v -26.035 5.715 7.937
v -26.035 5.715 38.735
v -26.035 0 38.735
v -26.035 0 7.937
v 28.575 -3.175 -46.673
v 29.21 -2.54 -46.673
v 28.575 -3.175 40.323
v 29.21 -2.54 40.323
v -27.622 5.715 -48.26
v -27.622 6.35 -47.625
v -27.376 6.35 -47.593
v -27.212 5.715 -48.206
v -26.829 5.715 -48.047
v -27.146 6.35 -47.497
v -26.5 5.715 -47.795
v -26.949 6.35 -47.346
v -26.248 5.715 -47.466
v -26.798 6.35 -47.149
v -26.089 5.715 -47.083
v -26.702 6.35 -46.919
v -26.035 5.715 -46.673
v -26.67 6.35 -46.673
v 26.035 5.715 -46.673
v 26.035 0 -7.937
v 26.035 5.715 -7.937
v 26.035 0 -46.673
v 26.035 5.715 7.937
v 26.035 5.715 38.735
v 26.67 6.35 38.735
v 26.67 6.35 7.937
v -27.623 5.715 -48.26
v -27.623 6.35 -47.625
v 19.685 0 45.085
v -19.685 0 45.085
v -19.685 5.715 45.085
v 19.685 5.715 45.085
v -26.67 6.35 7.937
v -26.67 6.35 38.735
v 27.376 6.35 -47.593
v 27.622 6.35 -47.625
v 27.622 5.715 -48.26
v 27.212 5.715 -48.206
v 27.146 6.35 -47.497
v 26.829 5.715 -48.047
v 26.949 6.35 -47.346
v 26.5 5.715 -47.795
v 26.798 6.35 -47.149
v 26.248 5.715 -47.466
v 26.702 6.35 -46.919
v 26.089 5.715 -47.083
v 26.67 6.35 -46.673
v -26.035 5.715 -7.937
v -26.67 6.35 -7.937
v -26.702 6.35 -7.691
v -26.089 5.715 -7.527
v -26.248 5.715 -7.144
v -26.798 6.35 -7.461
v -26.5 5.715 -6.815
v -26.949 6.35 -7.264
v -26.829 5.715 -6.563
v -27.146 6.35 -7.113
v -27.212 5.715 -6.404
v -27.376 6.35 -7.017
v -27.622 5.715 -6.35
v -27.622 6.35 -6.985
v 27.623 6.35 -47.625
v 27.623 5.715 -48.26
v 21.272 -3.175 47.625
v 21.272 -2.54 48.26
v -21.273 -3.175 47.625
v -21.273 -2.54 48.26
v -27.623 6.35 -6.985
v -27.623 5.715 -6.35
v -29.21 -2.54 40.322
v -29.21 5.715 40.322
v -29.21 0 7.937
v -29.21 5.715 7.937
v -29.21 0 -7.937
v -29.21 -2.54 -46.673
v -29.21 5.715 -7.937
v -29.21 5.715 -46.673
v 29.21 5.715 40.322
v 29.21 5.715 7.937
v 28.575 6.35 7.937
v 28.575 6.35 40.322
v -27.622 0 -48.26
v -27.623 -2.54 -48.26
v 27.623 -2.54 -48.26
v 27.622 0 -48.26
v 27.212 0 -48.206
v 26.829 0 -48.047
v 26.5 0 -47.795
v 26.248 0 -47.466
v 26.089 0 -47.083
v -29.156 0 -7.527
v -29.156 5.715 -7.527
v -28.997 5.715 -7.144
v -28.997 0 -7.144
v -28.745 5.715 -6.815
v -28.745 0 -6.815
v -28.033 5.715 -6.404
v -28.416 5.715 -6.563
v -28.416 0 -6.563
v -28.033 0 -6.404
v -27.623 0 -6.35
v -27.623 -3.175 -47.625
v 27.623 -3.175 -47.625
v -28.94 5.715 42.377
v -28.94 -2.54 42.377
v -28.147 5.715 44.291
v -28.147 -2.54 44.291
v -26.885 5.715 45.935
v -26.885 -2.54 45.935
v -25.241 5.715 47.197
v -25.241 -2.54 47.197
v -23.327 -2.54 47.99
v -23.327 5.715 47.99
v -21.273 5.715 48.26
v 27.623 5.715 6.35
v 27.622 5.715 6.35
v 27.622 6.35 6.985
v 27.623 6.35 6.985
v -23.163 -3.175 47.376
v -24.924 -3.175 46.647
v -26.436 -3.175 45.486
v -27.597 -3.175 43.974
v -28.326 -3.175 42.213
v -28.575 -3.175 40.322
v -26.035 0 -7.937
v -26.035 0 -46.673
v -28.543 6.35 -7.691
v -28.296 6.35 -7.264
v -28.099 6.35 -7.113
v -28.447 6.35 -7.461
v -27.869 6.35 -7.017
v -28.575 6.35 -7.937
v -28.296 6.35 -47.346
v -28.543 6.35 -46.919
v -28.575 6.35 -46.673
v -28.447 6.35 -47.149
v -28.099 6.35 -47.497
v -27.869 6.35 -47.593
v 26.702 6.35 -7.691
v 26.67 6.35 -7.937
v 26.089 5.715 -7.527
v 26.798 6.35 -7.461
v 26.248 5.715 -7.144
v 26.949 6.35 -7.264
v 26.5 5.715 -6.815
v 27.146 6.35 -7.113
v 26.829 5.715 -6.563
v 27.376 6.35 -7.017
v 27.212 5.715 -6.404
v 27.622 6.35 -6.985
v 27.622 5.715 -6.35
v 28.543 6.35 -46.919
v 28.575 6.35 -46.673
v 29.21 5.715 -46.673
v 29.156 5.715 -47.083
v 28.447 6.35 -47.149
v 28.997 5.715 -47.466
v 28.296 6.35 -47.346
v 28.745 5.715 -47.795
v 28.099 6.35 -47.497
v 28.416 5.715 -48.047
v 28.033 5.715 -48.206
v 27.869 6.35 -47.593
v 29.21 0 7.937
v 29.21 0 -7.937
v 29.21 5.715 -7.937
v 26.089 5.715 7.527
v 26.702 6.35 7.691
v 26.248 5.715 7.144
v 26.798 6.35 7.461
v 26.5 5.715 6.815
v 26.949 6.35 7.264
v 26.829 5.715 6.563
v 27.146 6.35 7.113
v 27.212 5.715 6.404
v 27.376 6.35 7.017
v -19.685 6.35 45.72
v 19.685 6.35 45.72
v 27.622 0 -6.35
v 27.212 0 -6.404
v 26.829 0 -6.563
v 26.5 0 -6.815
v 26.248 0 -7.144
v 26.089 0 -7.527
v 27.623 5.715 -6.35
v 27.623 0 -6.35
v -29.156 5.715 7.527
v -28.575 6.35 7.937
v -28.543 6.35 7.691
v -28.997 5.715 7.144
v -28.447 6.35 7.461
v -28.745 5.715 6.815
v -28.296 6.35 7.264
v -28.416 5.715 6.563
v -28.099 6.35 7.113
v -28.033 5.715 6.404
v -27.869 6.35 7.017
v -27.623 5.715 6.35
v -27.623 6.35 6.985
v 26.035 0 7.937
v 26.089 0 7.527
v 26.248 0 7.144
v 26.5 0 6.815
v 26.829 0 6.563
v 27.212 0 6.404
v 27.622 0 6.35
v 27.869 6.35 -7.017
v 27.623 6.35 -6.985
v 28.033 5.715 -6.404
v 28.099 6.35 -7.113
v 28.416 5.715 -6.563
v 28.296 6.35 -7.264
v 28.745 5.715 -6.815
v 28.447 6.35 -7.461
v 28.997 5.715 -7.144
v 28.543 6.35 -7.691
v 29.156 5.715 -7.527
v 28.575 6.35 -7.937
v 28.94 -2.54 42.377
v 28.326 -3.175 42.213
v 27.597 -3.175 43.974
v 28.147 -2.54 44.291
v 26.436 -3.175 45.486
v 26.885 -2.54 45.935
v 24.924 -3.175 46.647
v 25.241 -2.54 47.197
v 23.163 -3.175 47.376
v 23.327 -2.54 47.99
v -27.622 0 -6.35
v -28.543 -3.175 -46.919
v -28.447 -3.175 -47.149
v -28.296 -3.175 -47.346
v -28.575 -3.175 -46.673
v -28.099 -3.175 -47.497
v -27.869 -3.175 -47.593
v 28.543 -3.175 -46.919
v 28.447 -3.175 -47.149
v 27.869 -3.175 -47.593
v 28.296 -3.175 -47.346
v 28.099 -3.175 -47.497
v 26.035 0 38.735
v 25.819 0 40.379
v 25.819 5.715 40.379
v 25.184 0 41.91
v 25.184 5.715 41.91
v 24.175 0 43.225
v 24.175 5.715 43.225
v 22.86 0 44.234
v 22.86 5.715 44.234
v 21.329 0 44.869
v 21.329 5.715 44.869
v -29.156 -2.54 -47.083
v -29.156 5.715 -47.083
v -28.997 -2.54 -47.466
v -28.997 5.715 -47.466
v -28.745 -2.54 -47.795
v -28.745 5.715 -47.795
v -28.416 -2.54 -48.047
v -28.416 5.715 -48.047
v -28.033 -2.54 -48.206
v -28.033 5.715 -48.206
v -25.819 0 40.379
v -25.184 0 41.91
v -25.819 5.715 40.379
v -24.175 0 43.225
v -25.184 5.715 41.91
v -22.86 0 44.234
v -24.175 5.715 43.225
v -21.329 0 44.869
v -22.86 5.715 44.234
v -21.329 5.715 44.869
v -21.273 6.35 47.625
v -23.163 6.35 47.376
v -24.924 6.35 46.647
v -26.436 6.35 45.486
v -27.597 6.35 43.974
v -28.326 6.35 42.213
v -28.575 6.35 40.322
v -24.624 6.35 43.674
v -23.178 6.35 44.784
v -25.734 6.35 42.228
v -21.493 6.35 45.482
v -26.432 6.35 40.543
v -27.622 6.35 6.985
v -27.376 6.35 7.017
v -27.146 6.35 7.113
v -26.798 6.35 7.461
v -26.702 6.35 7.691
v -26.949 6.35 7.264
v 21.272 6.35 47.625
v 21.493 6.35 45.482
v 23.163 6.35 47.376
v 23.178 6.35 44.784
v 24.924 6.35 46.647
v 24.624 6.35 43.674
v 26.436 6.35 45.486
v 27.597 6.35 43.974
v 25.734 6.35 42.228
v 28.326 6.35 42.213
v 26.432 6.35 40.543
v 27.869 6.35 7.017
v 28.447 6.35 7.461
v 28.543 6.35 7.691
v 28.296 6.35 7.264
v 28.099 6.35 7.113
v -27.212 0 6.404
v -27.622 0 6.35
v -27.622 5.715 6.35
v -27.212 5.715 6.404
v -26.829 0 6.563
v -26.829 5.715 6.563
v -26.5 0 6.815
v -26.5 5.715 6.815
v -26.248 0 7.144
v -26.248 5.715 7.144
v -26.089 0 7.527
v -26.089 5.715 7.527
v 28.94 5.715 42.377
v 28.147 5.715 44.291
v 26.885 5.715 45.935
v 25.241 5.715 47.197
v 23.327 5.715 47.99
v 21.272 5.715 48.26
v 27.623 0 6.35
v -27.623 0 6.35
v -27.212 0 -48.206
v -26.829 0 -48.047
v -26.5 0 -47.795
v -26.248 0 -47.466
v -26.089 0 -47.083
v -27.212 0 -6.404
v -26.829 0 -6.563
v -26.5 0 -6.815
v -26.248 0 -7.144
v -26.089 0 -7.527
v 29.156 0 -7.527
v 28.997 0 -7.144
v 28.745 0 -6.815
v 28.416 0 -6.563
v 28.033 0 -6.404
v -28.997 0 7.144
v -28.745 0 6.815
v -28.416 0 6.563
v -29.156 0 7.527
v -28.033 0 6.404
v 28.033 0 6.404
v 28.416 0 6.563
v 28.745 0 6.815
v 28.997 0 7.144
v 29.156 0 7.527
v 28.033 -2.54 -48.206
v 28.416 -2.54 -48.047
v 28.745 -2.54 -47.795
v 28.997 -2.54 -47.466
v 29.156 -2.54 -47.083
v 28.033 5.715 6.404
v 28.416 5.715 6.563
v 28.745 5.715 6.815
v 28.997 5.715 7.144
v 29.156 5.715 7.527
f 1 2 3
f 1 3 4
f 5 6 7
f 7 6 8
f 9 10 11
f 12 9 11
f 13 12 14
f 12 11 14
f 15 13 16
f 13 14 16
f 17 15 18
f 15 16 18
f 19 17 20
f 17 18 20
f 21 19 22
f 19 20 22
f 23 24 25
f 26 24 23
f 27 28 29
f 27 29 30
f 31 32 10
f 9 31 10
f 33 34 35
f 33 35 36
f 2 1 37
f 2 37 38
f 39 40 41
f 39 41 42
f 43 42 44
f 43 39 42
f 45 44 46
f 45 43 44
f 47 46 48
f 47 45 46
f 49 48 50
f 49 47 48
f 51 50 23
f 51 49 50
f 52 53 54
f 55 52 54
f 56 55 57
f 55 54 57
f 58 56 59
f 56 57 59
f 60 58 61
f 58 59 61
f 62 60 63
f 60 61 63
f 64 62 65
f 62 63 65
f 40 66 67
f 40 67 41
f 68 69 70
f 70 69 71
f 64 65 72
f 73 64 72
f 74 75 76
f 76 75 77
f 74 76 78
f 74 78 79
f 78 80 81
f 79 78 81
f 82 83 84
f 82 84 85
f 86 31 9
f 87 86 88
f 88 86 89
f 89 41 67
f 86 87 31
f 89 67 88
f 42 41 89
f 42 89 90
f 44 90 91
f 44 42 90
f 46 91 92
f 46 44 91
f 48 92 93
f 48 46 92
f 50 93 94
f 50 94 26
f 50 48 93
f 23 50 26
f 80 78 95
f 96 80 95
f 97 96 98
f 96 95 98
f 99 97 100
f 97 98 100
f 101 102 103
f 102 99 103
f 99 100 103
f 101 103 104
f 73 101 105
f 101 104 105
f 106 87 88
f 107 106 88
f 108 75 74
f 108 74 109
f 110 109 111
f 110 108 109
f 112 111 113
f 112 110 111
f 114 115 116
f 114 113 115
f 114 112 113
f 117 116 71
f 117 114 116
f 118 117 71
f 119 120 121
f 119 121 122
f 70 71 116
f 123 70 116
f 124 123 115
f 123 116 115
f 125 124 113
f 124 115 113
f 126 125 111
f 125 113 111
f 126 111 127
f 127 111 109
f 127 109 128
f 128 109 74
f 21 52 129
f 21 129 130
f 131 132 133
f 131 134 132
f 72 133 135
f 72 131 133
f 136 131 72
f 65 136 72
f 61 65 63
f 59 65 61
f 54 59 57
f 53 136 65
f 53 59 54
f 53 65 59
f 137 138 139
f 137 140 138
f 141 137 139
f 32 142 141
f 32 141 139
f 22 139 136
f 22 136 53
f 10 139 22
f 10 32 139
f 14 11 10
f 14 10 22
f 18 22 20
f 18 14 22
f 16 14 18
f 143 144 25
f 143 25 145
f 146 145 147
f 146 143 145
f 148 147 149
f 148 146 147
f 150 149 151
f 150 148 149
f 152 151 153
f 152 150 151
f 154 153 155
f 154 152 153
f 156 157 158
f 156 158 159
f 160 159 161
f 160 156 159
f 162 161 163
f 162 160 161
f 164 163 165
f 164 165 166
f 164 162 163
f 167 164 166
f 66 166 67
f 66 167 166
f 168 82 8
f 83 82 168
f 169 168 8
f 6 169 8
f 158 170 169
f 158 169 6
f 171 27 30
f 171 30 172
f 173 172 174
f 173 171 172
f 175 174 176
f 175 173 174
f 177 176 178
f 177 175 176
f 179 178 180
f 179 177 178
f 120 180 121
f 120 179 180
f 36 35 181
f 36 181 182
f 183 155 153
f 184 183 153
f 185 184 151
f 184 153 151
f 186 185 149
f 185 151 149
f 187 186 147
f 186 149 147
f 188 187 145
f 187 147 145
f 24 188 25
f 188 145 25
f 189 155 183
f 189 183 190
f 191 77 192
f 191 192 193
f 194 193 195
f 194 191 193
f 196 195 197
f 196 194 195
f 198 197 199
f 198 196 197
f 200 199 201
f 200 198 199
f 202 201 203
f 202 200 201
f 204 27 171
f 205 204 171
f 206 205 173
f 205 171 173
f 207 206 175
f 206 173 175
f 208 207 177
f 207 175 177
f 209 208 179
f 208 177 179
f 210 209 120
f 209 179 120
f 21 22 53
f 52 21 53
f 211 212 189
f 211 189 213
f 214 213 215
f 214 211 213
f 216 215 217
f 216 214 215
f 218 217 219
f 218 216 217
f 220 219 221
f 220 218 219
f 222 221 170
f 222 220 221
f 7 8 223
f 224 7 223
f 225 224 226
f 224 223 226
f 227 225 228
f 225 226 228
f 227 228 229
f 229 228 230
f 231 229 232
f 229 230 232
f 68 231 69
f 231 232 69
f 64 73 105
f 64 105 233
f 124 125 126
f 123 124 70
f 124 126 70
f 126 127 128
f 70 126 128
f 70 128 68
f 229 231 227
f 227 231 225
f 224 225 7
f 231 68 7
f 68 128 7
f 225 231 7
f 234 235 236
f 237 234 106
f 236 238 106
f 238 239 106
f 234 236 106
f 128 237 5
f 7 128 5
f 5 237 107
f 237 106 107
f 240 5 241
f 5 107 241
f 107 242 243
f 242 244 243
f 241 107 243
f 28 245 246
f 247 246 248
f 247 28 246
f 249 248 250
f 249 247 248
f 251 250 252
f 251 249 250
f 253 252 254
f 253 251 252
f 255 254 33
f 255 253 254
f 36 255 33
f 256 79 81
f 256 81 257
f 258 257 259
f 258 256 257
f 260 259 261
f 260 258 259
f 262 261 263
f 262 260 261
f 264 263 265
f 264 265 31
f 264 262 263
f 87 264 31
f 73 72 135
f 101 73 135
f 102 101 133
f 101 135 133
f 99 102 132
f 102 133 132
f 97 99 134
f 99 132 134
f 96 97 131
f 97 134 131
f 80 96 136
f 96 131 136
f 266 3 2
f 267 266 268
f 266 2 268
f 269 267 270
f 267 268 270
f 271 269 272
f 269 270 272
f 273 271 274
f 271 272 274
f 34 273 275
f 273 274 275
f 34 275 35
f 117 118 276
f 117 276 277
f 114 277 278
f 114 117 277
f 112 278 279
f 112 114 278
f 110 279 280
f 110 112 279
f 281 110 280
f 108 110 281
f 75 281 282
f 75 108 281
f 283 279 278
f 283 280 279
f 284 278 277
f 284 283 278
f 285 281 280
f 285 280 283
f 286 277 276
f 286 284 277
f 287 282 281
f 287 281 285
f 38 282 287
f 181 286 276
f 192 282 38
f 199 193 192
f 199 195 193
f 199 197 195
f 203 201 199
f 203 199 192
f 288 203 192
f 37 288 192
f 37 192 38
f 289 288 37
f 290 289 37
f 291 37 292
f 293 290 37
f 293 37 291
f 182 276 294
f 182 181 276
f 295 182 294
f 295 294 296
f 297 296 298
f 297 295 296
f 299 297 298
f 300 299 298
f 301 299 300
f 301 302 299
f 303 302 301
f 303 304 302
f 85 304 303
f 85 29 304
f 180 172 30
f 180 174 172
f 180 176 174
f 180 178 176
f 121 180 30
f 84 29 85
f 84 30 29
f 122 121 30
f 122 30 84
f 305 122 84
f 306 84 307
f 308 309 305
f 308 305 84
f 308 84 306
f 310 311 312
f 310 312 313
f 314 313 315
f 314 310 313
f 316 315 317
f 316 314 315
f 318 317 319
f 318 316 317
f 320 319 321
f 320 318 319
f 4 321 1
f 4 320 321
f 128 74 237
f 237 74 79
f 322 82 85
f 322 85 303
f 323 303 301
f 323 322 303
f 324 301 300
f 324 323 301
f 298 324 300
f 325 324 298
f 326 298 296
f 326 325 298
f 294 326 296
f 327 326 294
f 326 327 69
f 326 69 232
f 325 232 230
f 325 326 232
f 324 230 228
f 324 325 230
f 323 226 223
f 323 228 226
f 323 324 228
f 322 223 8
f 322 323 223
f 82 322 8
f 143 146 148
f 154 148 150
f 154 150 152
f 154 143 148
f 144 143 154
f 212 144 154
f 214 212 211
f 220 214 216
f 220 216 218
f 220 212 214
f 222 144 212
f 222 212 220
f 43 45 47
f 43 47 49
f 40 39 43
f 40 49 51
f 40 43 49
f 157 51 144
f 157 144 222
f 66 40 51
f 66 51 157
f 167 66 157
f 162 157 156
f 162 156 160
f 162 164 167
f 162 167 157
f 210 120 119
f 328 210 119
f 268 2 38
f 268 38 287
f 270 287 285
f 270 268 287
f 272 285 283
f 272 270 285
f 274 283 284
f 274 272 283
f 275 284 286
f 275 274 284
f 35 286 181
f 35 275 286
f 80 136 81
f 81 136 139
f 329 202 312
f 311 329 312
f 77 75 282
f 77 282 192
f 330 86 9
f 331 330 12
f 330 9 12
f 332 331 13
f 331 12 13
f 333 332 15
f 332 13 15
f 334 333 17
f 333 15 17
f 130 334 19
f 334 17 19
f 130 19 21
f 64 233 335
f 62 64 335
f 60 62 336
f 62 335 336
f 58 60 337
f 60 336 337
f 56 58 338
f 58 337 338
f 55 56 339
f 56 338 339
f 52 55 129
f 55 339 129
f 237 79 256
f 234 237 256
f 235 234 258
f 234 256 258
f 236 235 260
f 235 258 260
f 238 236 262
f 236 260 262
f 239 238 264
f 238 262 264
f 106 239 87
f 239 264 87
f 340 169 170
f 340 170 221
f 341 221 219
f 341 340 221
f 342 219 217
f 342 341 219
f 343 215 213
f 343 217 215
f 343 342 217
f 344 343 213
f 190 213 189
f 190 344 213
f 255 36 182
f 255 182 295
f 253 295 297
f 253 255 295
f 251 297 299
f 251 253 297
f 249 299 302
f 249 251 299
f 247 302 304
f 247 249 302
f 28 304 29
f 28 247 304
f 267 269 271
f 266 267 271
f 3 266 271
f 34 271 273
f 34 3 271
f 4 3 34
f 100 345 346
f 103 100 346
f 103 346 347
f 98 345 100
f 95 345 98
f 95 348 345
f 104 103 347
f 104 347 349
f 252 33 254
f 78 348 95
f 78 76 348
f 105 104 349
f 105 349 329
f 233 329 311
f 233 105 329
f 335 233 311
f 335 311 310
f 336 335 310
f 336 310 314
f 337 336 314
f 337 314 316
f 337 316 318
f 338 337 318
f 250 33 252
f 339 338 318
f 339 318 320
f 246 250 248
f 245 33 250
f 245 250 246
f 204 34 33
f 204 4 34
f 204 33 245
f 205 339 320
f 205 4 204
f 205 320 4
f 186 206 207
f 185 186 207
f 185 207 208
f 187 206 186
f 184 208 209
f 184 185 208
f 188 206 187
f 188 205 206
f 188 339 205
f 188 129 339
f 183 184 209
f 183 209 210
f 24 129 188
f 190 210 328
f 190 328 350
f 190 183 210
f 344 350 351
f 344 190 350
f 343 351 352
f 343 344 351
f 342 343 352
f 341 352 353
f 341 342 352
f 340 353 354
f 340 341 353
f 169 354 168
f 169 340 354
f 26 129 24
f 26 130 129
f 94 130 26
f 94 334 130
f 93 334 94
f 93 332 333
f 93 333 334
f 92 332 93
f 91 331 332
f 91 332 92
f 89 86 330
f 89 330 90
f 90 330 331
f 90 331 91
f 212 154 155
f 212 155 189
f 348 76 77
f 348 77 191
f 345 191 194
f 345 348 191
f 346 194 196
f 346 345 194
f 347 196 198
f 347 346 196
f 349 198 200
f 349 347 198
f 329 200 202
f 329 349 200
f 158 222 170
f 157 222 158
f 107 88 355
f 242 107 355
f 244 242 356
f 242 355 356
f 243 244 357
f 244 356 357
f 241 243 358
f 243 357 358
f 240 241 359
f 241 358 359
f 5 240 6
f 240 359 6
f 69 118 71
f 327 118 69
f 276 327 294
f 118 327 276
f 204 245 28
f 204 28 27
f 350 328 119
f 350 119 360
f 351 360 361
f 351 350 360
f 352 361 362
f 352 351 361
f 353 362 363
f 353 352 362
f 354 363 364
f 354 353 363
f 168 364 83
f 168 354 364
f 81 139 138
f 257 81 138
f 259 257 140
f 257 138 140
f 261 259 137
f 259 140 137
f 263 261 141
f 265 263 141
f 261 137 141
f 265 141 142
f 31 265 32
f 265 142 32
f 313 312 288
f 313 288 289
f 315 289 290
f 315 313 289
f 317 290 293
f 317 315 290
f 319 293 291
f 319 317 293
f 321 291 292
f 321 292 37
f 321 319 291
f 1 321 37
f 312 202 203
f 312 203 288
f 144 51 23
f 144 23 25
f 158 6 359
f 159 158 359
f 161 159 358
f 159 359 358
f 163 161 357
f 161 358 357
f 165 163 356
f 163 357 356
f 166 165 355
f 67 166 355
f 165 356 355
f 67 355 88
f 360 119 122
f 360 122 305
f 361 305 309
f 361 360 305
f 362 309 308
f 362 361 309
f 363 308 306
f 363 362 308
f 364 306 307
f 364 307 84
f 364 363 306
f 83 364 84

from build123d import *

# Parameters (mm, degrees)
SKETCH1_W           = 58.42
SKETCH1_H           = 96.52
SKETCH1_W_2         = 52.07
SKETCH1_H_2         = 90.17
BOSS_EXTRUDE1_DEPTH = 6.35
SKETCH1_4_W         = 58.42
SKETCH1_4_H         = 96.52
BOSS_EXTRUDE2_DEPTH = 3.175
FILLET1_R           = 6.35
SKETCH4_W           = 52.07
SKETCH4_H           = 20.225419923
CUT_EXTRUDE2_DEPTH  = 6.35
SKETCH5_W           = 78.910757724
SKETCH5_H           = 12.7
CUT_EXTRUDE3_DEPTH  = 6.35
FILLET2_R           = 1.5875
FILLET3_R           = 7.9375
CHAMFER2_SIZE       = 0.635


with BuildPart() as part:
    # Sketch1 → Boss-Extrude1 (new body)
    with BuildSketch(Plane(origin=(0, 0, 0), x_dir=(1, 0, 0), z_dir=(0, 1, 0))):
        Rectangle(SKETCH1_W, SKETCH1_H)
        Rectangle(SKETCH1_W_2, SKETCH1_H_2, mode=Mode.SUBTRACT)
    extrude(amount=BOSS_EXTRUDE1_DEPTH)

    # Sketch1<4> → Boss-Extrude2 (add)
    with BuildSketch(Plane(origin=(0, 0, 0), x_dir=(1, 0, 0), z_dir=(0, 1, 0))):
        Rectangle(SKETCH1_4_W, SKETCH1_4_H)
    extrude(amount=-BOSS_EXTRUDE2_DEPTH)

    # Fillet1
    fillet1_edges = [part.edges().sort_by_distance(p)[0] for p in [
        (26.035, 3.175, 45.085),
        (26.035, 3.175, -45.085),
        (-26.035, 3.175, -45.085),
        (-26.035, 3.175, 45.085),
    ]]
    fillet(fillet1_edges, radius=FILLET1_R)

    # Sketch4 → Cut-Extrude2 (cut)
    with BuildSketch(Plane(origin=(0, 6.35, 0), x_dir=(1, 0, 0), z_dir=(0, 1, 0))):
        with Locations((0, 43.394544924)):
            Rectangle(SKETCH4_W, SKETCH4_H)
    extrude(amount=-CUT_EXTRUDE2_DEPTH, mode=Mode.SUBTRACT)

    # Sketch5 → Cut-Extrude3 (cut)
    with BuildSketch(Plane(origin=(0, 6.35, 0), x_dir=(1, 0, 0), z_dir=(0, 1, 0))):
        Rectangle(SKETCH5_W, SKETCH5_H)
    extrude(amount=-CUT_EXTRUDE3_DEPTH, mode=Mode.SUBTRACT)

    # Fillet2
    fillet2_edges = [part.edges().sort_by_distance(p)[0] for p in [
        (29.21, 3.175, -6.35),
        (-29.21, 3.175, -6.35),
        (26.035, 3.175, -6.35),
        (-26.035, 3.175, -6.35),
        (29.21, 3.175, 6.35),
        (-29.21, 3.175, 6.35),
        (26.035, 3.175, 6.35),
        (-26.035, 3.175, 6.35),
        (-29.21, 1.5875, -48.26),
        (29.21, 1.5875, -48.26),
        (26.035, 3.175, -48.26),
        (-26.035, 3.175, -48.26),
    ]]
    fillet(fillet2_edges, radius=FILLET2_R - 0.0001)  # a hair under: the kernel refuses the full size

    # Fillet3
    fillet3_edges = [part.edges().sort_by_distance(p)[0] for p in [
        (-29.21, 1.5875, 48.26),
        (29.21, 1.5875, 48.26),
    ]]
    fillet(fillet3_edges, radius=FILLET3_R)

    # Chamfer2
    chamfer2_edges = [part.edges().sort_by_distance(p)[0] for p in [
        (29.21, 6.35, -27.305),
        (-29.21, 6.35, 24.12995),
        (-26.035, 6.35, 23.3362),
        (-28.745061304, 6.35, 6.814938696),
        (-26.499938696, 6.35, 6.814938696),
        (26.499938696, 6.35, 6.814938696),
        (28.745061304, 6.35, 6.814938696),
        (26.035, 6.35, -27.305),
        (26.499938696, 6.35, -47.795061304),
        (28.745061304, 6.35, -47.795061304),
        (26.499938696, 6.35, -6.814938696),
        (28.745061304, 6.35, -6.814938696),
        (-29.21, 6.35, -27.305),
        (-26.035, 6.35, -27.305),
        (-26.499938696, 6.35, -47.795061304),
        (-28.745061304, 6.35, -47.795061304),
        (-28.745061304, 6.35, -6.814938696),
        (-26.499938696, 6.35, -6.814938696),
        (0, -3.175, -48.26),
        (-28.745061304, -3.175, -47.795061304),
        (28.745061304, -3.175, -47.795061304),
        (29.21, 6.35, 24.12995),
        (29.21, -3.175, -3.17505),
        (0, -3.175, 48.26),
        (-29.21, -3.175, -3.17505),
        (-26.885160076, -3.175, 45.935160076),
        (26.885160076, -3.175, 45.935160076),
        (0, 6.35, 48.26),
        (-26.885160076, 6.35, 45.935160076),
        (26.885160076, 6.35, 45.935160076),
        (26.035, 6.35, 23.3362),
        (0, 6.35, 45.085),
        (24.175128061, 6.35, 43.225128061),
        (-24.175128061, 6.35, 43.225128061),
    ]]
    chamfer(chamfer2_edges, length=CHAMFER2_SIZE)


solid = part.part
